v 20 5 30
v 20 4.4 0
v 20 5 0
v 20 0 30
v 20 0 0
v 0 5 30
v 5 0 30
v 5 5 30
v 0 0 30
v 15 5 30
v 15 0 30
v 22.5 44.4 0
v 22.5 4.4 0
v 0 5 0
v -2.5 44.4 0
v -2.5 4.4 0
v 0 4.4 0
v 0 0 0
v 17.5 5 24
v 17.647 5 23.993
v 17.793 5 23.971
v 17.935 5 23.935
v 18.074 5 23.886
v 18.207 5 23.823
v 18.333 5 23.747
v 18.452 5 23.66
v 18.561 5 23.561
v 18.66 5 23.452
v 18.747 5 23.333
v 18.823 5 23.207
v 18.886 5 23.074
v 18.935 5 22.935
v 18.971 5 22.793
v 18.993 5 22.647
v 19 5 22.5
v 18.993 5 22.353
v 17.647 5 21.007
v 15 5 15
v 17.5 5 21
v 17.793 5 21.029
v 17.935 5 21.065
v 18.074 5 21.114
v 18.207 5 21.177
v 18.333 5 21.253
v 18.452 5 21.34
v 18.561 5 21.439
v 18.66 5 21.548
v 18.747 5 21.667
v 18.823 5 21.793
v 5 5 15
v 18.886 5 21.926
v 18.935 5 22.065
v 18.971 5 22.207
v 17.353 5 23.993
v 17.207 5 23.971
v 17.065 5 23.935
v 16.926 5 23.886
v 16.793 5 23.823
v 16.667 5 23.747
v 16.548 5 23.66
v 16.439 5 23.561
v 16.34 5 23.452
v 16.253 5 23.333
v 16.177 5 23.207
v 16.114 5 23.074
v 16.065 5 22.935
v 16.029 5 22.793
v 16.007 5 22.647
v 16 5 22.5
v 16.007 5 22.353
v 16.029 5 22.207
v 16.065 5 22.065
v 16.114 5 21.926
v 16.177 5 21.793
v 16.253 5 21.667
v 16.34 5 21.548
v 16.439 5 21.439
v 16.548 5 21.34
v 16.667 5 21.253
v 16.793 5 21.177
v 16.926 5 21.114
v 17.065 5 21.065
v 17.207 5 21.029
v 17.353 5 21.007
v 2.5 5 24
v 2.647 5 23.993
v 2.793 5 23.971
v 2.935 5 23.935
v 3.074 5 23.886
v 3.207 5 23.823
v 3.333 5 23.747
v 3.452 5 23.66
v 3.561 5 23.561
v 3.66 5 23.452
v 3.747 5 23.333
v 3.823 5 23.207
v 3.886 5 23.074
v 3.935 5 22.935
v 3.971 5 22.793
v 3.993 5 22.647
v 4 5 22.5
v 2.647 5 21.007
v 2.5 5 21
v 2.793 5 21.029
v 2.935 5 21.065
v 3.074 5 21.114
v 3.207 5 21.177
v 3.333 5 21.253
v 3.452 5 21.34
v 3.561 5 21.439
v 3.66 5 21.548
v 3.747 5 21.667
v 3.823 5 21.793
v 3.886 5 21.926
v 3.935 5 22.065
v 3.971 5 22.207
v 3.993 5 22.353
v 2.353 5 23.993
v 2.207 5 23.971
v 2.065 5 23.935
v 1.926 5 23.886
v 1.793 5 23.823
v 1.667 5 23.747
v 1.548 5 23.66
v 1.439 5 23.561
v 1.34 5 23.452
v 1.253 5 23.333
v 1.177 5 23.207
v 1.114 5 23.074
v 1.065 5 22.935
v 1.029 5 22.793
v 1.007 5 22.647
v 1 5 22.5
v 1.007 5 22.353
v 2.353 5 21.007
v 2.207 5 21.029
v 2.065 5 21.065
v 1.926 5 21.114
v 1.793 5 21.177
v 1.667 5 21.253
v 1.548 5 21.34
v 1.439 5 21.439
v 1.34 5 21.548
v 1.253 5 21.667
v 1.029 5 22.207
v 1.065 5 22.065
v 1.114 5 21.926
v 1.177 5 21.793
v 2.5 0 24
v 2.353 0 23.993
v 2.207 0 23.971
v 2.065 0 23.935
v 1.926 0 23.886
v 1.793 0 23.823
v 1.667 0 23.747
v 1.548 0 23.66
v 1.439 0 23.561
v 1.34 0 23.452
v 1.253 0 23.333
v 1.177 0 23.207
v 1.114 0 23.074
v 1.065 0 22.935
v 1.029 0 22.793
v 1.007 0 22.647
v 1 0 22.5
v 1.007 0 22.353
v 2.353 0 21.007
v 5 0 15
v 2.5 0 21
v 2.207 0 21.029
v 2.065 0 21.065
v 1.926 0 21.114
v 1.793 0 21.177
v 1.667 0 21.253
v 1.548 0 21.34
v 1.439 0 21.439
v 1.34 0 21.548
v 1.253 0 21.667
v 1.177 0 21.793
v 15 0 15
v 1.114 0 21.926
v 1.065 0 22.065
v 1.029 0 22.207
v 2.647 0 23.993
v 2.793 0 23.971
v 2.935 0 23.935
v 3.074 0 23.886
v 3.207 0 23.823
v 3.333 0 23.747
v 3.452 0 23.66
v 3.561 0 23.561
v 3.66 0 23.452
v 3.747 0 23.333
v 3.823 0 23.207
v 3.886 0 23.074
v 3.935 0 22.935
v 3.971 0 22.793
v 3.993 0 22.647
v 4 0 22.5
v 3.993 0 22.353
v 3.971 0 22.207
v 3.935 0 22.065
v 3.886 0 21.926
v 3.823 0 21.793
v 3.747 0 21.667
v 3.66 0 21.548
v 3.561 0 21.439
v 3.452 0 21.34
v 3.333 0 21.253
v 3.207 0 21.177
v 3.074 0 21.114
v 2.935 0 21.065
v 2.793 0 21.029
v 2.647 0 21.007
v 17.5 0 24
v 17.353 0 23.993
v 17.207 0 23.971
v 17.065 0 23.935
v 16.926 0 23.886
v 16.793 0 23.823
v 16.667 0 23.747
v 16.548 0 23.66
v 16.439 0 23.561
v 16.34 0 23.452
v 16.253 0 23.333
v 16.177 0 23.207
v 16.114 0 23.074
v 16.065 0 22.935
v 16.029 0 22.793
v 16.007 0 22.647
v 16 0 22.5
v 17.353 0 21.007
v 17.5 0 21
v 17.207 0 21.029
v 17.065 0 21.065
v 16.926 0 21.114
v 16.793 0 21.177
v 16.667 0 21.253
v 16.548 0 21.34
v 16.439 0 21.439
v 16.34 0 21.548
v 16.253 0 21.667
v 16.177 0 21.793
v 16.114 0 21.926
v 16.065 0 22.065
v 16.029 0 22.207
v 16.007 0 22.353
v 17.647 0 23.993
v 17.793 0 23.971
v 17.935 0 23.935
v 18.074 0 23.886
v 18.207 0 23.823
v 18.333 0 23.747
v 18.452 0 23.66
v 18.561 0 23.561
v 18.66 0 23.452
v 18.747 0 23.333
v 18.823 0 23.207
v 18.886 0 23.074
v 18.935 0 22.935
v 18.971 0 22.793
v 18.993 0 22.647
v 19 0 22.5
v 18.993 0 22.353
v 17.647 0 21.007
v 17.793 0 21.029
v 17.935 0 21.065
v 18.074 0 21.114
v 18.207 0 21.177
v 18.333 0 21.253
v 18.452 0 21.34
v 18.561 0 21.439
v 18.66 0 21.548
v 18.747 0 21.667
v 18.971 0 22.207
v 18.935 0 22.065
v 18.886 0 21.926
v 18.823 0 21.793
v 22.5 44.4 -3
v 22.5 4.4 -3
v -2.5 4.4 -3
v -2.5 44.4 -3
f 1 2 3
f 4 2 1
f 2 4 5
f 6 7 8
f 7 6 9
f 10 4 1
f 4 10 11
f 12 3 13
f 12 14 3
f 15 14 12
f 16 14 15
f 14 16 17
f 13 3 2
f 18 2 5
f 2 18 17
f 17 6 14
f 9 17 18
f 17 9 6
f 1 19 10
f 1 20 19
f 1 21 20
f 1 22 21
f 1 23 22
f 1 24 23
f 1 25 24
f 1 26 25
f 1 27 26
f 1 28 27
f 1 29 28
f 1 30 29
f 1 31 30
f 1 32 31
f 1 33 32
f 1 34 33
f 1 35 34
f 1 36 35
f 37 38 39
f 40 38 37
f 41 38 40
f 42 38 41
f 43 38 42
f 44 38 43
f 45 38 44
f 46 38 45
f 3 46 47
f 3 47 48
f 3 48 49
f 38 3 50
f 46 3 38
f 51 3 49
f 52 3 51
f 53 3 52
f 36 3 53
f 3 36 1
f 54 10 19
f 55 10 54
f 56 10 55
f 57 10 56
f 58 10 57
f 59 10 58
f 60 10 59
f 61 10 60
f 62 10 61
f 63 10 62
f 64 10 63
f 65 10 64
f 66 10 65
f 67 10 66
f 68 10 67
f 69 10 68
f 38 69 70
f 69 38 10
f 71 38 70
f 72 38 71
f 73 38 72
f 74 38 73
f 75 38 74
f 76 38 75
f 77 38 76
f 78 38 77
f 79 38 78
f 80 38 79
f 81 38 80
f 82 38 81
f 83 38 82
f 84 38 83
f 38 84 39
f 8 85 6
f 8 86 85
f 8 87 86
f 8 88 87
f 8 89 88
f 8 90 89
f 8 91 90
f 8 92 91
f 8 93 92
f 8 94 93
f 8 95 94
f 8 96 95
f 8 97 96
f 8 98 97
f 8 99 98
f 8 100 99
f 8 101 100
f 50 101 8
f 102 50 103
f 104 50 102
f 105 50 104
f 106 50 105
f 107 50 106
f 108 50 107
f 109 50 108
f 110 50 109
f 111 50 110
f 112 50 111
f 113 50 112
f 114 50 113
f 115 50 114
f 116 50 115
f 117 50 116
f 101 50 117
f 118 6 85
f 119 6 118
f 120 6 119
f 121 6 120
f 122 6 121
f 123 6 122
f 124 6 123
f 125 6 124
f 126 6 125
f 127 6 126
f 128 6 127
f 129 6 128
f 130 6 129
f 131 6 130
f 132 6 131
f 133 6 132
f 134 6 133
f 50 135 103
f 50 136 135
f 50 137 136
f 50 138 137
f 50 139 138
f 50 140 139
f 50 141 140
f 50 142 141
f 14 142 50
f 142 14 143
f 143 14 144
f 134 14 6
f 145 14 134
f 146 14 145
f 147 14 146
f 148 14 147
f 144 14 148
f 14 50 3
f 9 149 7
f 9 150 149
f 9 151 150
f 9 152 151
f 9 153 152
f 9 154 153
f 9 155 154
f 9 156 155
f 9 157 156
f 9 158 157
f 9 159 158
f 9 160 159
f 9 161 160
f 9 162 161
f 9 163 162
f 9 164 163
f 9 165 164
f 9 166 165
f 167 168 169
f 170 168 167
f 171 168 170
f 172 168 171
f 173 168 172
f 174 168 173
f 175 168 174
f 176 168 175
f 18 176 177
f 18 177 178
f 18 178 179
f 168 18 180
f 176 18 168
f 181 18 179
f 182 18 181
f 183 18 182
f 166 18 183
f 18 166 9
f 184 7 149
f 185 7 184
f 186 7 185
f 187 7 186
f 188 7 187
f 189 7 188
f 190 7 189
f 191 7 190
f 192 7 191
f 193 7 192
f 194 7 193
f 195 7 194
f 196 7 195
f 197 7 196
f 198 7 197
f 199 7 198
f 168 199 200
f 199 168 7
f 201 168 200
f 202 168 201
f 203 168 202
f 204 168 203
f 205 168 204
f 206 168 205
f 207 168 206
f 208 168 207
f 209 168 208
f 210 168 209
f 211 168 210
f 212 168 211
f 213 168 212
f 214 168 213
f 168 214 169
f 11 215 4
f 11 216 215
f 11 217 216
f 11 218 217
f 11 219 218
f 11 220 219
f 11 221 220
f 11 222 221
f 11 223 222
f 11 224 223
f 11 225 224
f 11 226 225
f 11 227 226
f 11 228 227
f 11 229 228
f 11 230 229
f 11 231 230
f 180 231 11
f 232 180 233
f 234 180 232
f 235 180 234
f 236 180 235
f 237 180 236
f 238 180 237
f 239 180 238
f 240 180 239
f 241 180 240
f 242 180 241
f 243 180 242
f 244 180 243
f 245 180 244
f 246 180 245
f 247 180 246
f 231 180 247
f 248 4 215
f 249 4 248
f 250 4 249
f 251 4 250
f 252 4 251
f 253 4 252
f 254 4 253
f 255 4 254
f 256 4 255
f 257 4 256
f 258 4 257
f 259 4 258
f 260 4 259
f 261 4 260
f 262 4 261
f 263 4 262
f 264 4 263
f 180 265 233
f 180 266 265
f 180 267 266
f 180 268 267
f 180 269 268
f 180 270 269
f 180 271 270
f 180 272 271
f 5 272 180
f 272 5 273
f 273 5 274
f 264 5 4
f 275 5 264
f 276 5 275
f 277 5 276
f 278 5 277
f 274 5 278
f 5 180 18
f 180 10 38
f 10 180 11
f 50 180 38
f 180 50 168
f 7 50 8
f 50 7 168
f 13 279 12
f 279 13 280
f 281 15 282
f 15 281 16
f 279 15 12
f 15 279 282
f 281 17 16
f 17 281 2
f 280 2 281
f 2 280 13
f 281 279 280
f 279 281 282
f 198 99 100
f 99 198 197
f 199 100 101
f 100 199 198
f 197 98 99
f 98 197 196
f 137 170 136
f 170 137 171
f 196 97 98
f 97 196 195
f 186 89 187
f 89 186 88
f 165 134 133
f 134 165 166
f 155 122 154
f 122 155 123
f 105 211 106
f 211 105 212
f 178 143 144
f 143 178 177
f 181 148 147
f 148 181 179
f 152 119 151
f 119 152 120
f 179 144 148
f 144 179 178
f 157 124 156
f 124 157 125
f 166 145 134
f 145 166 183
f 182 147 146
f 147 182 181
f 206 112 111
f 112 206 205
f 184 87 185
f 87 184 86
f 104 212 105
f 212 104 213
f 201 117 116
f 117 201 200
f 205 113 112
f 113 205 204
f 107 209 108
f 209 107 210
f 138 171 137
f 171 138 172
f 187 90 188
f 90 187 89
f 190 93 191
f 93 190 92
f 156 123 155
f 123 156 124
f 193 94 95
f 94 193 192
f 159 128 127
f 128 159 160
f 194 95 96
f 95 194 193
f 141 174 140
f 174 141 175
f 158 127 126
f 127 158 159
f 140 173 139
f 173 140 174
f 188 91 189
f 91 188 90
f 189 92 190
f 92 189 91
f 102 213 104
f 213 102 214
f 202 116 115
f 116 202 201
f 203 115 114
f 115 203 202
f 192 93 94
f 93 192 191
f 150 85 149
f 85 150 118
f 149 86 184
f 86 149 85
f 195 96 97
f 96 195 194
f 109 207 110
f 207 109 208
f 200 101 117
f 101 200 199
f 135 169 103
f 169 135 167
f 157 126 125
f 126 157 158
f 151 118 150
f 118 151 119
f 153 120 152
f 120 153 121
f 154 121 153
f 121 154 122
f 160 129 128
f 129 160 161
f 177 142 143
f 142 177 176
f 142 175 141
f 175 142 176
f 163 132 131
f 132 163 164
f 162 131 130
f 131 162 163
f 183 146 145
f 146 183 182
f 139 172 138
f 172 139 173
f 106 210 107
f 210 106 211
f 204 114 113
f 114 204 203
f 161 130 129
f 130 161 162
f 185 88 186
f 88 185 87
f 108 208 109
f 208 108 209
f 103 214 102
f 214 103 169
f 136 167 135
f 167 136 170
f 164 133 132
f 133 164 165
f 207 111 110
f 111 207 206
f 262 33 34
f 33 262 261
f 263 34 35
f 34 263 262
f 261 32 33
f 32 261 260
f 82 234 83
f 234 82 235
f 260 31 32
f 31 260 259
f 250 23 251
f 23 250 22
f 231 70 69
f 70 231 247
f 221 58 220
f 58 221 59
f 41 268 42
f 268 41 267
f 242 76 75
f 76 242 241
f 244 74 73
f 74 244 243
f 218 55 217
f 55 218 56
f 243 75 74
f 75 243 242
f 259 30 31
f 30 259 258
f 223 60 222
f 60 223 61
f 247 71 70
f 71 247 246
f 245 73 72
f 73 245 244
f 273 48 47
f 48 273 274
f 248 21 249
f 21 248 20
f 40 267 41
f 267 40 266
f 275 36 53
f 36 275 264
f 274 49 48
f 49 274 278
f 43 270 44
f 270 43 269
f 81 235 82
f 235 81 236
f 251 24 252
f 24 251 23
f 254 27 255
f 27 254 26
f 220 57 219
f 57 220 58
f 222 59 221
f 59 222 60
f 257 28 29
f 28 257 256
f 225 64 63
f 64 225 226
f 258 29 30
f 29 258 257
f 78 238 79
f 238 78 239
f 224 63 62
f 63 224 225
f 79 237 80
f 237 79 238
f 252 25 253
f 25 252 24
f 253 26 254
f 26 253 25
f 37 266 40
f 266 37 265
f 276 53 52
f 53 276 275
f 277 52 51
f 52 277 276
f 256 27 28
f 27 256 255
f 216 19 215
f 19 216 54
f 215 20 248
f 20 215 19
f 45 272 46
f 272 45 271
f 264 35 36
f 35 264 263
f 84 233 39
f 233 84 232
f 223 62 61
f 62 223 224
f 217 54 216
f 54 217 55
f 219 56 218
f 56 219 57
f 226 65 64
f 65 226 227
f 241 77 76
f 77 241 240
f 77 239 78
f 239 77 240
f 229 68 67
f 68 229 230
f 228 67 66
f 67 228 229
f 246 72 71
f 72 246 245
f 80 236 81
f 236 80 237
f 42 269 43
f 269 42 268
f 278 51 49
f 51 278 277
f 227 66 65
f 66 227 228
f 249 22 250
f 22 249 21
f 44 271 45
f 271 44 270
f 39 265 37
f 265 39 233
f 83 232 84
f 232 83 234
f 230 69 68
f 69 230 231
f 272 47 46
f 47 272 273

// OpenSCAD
$fn = 64;

// Parameters (mm)
interrupter_width     = 20;   // X
interrupter_height    = 30;   // Z
interrupter_thickness = 5;    // Y (depth)

gap_width = 10;               // X opening
gap_depth = 15;               // Z depth of slot from top

mounting_hole_diameter = 3;

pcb_width     = 25;           // X
pcb_length    = 40;           // Y
pcb_thickness = 1.6;          // Z

base_plate_thickness = 2;     // Z

// Small overlap to guarantee watertight unions
overlap = 0.6;

// Interrupter Body (U-shaped slot)
module interrupter_body() {
    difference() {
        // Solid block first, then cut the U-slot out of it
        cube([interrupter_width, interrupter_thickness, interrupter_height], center=false);

        // Slot cutout (opens at the TOP, goes down by gap_depth)
        translate([(interrupter_width - gap_width)/2, -overlap, interrupter_height - gap_depth])
            cube([gap_width, interrupter_thickness + 2*overlap, gap_depth + overlap], center=false);
    }
}

// Mounting holes as SUBTRACTIONS (through Y)
module mounting_holes_cut() {
    // Place holes in the two "arms" (left and right of the slot)
    // Keep them centered in Y and within the arm thickness in X.
    arm_w = (interrupter_width - gap_width)/2;
    hole_x_offset = arm_w/2; // center of each arm

    for (x = [hole_x_offset, interrupter_width - hole_x_offset]) {
        translate([x, interrupter_thickness/2, interrupter_height - gap_depth/2])
            rotate([90, 0, 0])
                cylinder(h = interrupter_thickness + 2*overlap,
                         d = mounting_hole_diameter,
                         center=true);
    }
}

// PCB block (connected to body with calculated placement + overlap)
module pcb_block() {
    // Attach to the BACK face (positive Y) of the interrupter body
    translate([
        interrupter_width/2 - pcb_width/2,
        interrupter_thickness - overlap,
        -pcb_thickness
    ])
        cube([pcb_width, pcb_length, pcb_thickness], center=false);
}

// Base plate block (connected to PCB with overlap)
module base_plate_block() {
    translate([
        interrupter_width/2 - pcb_width/2,
        interrupter_thickness - overlap,
        -pcb_thickness - base_plate_thickness + overlap
    ])
        cube([pcb_width, pcb_length, base_plate_thickness], center=false);
}

// Photo Interrupter Assembly (ONE connected solid)
module photo_interrupter() {
    difference() {
        union() {
            interrupter_body();
            pcb_block();
            base_plate_block();
        }
        mounting_holes_cut();
    }
}

photo_interrupter();
